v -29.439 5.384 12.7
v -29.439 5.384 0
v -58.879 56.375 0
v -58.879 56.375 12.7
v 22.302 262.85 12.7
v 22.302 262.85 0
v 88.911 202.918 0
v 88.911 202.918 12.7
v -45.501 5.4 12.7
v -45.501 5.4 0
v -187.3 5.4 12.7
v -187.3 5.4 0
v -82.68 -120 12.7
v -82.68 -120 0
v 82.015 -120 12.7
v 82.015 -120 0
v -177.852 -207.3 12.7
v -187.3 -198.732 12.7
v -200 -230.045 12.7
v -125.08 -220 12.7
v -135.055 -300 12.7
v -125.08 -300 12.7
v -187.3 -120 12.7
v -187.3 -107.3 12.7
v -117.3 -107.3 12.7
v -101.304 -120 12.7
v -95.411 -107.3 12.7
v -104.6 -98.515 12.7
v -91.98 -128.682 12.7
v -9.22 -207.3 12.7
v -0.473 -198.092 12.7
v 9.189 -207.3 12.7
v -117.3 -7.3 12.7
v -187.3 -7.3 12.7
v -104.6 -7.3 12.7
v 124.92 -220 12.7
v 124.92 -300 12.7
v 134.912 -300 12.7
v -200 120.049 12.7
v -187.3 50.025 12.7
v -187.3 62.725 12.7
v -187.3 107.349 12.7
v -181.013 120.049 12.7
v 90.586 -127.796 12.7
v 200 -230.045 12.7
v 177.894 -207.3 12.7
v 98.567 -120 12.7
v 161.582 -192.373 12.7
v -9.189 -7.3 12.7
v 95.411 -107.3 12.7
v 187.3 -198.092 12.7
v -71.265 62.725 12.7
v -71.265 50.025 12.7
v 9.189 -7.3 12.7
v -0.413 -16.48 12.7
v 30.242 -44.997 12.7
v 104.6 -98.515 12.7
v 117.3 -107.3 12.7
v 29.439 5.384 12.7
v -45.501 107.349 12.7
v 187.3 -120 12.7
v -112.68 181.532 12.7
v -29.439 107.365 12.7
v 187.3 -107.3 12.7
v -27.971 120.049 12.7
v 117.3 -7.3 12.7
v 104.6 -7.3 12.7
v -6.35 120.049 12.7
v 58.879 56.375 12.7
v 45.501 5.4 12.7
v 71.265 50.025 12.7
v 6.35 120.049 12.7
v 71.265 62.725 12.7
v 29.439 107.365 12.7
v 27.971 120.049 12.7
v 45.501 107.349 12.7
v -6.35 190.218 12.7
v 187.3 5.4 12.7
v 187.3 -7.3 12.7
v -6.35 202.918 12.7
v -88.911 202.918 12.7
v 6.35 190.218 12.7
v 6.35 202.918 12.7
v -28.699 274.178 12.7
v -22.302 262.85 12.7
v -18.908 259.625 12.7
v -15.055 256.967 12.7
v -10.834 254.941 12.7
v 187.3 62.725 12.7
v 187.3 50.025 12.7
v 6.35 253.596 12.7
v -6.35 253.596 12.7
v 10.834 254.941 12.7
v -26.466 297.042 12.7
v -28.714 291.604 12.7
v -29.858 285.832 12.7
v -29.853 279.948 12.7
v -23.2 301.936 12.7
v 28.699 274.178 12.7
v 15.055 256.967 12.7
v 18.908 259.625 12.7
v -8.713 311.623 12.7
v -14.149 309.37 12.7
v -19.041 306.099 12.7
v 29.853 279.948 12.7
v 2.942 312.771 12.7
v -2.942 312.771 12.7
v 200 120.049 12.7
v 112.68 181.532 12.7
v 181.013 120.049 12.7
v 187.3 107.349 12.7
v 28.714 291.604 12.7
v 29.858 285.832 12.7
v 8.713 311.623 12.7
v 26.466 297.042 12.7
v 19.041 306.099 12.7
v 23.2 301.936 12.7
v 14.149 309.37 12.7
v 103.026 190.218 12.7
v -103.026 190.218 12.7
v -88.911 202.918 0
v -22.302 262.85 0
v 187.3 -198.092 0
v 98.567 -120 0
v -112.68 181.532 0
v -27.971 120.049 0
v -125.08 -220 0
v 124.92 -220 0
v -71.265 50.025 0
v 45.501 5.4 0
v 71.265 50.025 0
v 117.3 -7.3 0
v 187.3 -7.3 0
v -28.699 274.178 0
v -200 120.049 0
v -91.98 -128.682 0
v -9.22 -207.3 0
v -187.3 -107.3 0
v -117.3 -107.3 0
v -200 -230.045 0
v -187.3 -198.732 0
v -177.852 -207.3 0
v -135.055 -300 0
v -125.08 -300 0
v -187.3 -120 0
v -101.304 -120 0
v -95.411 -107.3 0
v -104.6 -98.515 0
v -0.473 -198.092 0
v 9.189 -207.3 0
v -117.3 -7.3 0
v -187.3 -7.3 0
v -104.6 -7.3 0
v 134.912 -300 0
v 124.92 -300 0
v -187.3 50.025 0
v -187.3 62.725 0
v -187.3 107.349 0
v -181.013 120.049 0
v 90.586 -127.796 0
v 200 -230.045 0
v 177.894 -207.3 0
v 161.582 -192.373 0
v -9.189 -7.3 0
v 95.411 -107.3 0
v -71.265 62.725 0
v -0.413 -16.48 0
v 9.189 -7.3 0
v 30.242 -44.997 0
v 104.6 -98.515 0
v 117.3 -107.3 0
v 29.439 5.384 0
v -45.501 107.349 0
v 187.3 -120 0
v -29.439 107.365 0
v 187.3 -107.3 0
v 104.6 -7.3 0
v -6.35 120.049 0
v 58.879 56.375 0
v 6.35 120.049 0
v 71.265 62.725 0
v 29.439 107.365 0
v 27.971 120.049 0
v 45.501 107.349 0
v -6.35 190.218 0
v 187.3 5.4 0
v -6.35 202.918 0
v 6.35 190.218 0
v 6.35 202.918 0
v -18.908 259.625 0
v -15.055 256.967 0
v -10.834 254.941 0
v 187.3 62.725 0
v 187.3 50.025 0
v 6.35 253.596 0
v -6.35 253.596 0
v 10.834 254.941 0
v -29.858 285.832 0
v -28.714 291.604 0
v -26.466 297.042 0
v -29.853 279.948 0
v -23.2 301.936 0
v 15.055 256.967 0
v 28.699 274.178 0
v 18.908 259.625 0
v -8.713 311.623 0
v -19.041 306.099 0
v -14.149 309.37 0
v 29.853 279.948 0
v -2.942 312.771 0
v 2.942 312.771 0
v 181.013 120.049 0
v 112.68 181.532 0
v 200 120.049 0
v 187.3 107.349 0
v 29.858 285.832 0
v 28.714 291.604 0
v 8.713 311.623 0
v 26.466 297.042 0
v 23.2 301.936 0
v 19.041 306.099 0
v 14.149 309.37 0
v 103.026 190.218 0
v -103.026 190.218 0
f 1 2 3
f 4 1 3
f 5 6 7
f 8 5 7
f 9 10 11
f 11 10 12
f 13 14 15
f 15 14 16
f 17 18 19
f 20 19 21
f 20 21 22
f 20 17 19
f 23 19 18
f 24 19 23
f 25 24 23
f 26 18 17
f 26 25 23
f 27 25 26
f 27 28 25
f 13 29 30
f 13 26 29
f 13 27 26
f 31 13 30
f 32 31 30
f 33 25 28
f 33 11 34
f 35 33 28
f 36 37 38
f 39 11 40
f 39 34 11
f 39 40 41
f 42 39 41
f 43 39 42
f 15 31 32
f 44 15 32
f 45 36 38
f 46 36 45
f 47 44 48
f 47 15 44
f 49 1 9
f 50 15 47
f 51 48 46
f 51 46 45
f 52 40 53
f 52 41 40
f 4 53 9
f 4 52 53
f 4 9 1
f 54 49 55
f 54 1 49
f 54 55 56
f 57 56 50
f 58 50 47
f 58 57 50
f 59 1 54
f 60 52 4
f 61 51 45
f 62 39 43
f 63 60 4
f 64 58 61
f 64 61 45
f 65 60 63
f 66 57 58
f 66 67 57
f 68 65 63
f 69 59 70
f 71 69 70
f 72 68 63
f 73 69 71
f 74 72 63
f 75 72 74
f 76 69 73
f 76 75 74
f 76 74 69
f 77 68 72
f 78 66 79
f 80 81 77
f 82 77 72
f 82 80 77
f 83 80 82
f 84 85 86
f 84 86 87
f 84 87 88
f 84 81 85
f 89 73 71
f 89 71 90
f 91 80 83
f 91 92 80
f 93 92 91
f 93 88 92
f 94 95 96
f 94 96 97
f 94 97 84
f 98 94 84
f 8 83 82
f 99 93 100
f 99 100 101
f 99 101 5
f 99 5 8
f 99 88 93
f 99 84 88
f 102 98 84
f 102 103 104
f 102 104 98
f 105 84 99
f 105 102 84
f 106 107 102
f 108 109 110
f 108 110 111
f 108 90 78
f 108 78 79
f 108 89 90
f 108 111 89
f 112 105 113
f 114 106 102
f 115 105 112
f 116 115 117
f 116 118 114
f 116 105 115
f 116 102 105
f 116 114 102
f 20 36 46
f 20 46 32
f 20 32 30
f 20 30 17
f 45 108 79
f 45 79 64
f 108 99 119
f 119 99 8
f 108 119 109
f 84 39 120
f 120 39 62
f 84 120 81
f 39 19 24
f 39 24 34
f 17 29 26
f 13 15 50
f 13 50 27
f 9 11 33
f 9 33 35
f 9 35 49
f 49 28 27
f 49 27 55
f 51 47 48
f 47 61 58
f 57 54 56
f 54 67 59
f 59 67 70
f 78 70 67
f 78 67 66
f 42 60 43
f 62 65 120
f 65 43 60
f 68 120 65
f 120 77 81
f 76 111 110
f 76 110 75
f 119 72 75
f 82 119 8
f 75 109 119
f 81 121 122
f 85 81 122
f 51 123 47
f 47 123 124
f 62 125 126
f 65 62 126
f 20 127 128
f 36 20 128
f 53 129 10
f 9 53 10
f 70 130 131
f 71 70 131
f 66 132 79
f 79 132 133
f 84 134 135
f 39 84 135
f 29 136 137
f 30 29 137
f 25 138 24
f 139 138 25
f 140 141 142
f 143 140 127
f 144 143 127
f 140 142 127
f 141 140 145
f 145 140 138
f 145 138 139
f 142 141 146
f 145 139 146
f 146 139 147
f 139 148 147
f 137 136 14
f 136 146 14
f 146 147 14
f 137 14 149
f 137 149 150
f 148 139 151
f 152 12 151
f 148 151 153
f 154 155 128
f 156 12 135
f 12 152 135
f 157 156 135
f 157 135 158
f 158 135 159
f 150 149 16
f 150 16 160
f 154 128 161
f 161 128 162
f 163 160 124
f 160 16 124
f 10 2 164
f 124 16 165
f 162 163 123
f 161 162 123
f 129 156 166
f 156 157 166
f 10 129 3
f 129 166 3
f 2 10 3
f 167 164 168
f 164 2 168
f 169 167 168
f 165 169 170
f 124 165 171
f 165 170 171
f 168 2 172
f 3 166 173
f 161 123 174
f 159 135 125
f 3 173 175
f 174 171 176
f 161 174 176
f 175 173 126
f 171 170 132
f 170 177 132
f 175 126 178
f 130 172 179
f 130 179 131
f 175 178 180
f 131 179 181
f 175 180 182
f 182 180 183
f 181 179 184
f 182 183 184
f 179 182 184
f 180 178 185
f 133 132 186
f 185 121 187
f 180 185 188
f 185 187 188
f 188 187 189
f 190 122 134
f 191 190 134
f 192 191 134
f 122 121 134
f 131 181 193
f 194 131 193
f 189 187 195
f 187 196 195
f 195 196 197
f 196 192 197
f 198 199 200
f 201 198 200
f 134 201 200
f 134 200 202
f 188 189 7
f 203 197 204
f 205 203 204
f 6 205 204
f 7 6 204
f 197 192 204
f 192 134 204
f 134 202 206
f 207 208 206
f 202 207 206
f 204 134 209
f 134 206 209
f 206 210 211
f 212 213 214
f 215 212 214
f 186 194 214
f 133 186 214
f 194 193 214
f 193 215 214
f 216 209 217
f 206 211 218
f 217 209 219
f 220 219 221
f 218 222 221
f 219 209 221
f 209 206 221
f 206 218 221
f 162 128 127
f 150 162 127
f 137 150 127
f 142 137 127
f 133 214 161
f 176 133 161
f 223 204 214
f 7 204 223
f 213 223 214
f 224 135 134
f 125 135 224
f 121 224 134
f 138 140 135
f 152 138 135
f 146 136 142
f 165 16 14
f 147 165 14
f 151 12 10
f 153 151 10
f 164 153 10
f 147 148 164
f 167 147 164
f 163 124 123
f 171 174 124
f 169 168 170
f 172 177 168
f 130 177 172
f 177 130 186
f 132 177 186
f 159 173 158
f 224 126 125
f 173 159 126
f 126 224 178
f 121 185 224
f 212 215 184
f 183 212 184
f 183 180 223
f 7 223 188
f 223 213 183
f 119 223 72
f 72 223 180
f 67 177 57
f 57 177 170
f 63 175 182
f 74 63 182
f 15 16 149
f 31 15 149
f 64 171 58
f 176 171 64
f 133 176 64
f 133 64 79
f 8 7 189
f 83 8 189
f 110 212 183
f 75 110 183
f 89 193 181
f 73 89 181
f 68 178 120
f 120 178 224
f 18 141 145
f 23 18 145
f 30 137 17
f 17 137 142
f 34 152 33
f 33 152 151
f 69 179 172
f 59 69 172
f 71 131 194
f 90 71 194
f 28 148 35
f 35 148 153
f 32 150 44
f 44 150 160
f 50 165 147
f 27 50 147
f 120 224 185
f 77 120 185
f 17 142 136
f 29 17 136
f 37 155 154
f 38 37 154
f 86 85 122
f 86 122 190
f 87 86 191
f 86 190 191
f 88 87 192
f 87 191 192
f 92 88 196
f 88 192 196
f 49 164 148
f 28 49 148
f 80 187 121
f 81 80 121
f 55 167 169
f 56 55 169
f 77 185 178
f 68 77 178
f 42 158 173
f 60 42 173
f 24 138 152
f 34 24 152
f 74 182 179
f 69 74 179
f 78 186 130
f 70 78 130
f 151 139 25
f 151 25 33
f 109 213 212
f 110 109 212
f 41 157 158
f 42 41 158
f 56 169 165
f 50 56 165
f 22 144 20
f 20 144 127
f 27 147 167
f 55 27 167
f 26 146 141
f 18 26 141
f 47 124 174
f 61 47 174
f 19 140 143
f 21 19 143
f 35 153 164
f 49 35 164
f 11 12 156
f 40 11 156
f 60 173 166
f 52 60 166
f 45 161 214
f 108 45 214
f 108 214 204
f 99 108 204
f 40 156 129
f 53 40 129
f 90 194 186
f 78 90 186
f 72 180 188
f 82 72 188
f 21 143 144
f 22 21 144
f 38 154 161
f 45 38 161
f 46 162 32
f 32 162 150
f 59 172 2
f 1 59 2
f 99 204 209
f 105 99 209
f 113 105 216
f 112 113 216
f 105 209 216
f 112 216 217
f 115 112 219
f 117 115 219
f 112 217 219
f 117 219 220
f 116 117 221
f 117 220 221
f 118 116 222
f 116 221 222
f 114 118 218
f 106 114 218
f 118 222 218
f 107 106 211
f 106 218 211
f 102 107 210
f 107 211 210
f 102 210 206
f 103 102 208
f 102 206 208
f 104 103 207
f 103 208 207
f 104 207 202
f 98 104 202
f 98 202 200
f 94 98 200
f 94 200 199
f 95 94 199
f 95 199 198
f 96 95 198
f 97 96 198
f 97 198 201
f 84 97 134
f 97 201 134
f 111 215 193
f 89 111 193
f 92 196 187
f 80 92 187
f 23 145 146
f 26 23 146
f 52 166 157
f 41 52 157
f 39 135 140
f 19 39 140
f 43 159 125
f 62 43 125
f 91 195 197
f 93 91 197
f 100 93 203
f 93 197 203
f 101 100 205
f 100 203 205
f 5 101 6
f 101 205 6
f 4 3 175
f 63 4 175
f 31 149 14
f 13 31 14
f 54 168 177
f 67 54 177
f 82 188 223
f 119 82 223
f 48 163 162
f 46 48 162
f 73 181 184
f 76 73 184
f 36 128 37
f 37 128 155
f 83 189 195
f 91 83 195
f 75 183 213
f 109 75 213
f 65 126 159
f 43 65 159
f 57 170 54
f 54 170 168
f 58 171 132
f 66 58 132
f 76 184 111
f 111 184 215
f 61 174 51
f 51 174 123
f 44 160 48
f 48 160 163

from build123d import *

# Parameters (mm, degrees)
SKETCH2_W           = 70
SKETCH2_H           = 100
BOSS_EXTRUDE3_DEPTH = 12.7


with BuildPart() as part:
    # Sketch2 → Boss-Extrude3 (new body)
    with BuildSketch(Plane.XY):
        with BuildLine():
            Line((-200, -230.044545372), (-135.055496126, -300))
            Line((-135.055496126, -300), (-125.080405008, -300))
            Line((-125.080405008, -300), (-125.080405008, -220))
            Line((-125.080405008, -220), (124.919594992, -220))
            Line((124.919594992, -220), (124.919594992, -300))
            Line((124.919594992, -300), (134.911595754, -300))
            Line((134.911595754, -300), (200, -230.044545372))
            Line((200, -230.044545372), (200, 120.049170717))
            Line((200, 120.049170717), (28.699194546, 274.177780708))
            ThreePointArc((28.699194546, 274.177780708), (0, 312.915986038), (-28.699194546, 274.177780708))
            Line((-28.699194546, 274.177780708), (-200, 120.049170717))
            Line((-200, 120.049170717), (-200, -230.044545372))
        make_face()
        Polygon((-187.3, -198.731620565), (-187.3, -120), (-101.303698117, -120), align=None, mode=Mode.SUBTRACT)
        Polygon((-177.851600054, -207.3), (-91.979918019, -128.682471814), (-9.219885484, -207.3), align=None, mode=Mode.SUBTRACT)
        Polygon((-0.473030641, -198.092257044), (-82.680114516, -120), (82.015084133, -120), align=None, mode=Mode.SUBTRACT)
        with Locations((-152.3, -57.3)):
            Rectangle(SKETCH2_W, SKETCH2_H, mode=Mode.SUBTRACT)
        Polygon((-71.265160823, 50.024585359), (-45.501144454, 5.4), (-187.3, 5.4), (-187.3, 50.024585359), align=None, mode=Mode.SUBTRACT)
        Polygon((-104.6, -7.3), (-9.189123593, -7.3), (-104.6, -98.514987005), align=None, mode=Mode.SUBTRACT)
        Polygon((177.8939034, -207.3), (9.189123593, -207.3), (90.58572411, -127.795746586), (161.581783291, -192.372871222), align=None, mode=Mode.SUBTRACT)
        Polygon((187.3, -198.092257044), (98.567023769, -120), (187.3, -120), align=None, mode=Mode.SUBTRACT)
        Polygon((-95.410876407, -107.3), (-0.412987416, -16.479838441), (30.242078983, -44.997134394), (95.410876407, -107.3), align=None, mode=Mode.SUBTRACT)
        Polygon((9.189123593, -7.3), (104.6, -7.3), (104.6, -98.514987005), align=None, mode=Mode.SUBTRACT)
        with Locations((152.3, -57.3)):
            Rectangle(SKETCH2_W, SKETCH2_H, mode=Mode.SUBTRACT)
        Polygon((-45.501144454, 107.349170717), (-71.265160823, 62.724585359), (-187.3, 62.724585359), (-187.3, 107.349170717), align=None, mode=Mode.SUBTRACT)
        Polygon((-112.679699791, 181.531958935), (-27.970761031, 120.049170717), (-181.012575458, 120.049170717), align=None, mode=Mode.SUBTRACT)
        Polygon((-103.026071592, 190.217850935), (-6.35, 190.217850935), (-6.35, 120.049170717), align=None, mode=Mode.SUBTRACT)
        with BuildLine():
            Line((-6.35, 253.595728536), (-6.35, 202.917850935))
            Line((-6.35, 202.917850935), (-88.911104686, 202.917850935))
            Line((-88.911104686, 202.917850935), (-22.301550494, 262.85007351))
            ThreePointArc((-22.301550494, 262.85007351), (-15.054519642, 256.966777219), (-6.35, 253.595728536))
        make_face(mode=Mode.SUBTRACT)
        Polygon((29.439464567, 5.383936982), (-29.439464567, 5.383936982), (-58.878929133, 56.374585359), (-29.439464567, 107.365233736), (29.439464567, 107.365233736), (58.878929133, 56.374585359), align=None, mode=Mode.SUBTRACT)
        Polygon((187.3, 5.4), (45.501144454, 5.4), (71.265160823, 50.024585359), (187.3, 50.024585359), align=None, mode=Mode.SUBTRACT)
        Polygon((187.3, 107.349170717), (187.3, 62.724585359), (71.265160823, 62.724585359), (45.501144454, 107.349170717), align=None, mode=Mode.SUBTRACT)
        Polygon((6.35, 120.049170717), (6.35, 190.217850935), (103.026071592, 190.217850935), align=None, mode=Mode.SUBTRACT)
        with BuildLine():
            Line((6.35, 202.917850935), (6.35, 253.595728536))
            ThreePointArc((6.35, 253.595728536), (15.054519642, 256.966777219), (22.301550494, 262.85007351))
            Line((22.301550494, 262.85007351), (88.911104686, 202.917850935))
            Line((88.911104686, 202.917850935), (6.35, 202.917850935))
        make_face(mode=Mode.SUBTRACT)
        Polygon((181.012575458, 120.049170717), (27.970761031, 120.049170717), (112.679699791, 181.531958935), align=None, mode=Mode.SUBTRACT)
    extrude(amount=BOSS_EXTRUDE3_DEPTH)


solid = part.part
